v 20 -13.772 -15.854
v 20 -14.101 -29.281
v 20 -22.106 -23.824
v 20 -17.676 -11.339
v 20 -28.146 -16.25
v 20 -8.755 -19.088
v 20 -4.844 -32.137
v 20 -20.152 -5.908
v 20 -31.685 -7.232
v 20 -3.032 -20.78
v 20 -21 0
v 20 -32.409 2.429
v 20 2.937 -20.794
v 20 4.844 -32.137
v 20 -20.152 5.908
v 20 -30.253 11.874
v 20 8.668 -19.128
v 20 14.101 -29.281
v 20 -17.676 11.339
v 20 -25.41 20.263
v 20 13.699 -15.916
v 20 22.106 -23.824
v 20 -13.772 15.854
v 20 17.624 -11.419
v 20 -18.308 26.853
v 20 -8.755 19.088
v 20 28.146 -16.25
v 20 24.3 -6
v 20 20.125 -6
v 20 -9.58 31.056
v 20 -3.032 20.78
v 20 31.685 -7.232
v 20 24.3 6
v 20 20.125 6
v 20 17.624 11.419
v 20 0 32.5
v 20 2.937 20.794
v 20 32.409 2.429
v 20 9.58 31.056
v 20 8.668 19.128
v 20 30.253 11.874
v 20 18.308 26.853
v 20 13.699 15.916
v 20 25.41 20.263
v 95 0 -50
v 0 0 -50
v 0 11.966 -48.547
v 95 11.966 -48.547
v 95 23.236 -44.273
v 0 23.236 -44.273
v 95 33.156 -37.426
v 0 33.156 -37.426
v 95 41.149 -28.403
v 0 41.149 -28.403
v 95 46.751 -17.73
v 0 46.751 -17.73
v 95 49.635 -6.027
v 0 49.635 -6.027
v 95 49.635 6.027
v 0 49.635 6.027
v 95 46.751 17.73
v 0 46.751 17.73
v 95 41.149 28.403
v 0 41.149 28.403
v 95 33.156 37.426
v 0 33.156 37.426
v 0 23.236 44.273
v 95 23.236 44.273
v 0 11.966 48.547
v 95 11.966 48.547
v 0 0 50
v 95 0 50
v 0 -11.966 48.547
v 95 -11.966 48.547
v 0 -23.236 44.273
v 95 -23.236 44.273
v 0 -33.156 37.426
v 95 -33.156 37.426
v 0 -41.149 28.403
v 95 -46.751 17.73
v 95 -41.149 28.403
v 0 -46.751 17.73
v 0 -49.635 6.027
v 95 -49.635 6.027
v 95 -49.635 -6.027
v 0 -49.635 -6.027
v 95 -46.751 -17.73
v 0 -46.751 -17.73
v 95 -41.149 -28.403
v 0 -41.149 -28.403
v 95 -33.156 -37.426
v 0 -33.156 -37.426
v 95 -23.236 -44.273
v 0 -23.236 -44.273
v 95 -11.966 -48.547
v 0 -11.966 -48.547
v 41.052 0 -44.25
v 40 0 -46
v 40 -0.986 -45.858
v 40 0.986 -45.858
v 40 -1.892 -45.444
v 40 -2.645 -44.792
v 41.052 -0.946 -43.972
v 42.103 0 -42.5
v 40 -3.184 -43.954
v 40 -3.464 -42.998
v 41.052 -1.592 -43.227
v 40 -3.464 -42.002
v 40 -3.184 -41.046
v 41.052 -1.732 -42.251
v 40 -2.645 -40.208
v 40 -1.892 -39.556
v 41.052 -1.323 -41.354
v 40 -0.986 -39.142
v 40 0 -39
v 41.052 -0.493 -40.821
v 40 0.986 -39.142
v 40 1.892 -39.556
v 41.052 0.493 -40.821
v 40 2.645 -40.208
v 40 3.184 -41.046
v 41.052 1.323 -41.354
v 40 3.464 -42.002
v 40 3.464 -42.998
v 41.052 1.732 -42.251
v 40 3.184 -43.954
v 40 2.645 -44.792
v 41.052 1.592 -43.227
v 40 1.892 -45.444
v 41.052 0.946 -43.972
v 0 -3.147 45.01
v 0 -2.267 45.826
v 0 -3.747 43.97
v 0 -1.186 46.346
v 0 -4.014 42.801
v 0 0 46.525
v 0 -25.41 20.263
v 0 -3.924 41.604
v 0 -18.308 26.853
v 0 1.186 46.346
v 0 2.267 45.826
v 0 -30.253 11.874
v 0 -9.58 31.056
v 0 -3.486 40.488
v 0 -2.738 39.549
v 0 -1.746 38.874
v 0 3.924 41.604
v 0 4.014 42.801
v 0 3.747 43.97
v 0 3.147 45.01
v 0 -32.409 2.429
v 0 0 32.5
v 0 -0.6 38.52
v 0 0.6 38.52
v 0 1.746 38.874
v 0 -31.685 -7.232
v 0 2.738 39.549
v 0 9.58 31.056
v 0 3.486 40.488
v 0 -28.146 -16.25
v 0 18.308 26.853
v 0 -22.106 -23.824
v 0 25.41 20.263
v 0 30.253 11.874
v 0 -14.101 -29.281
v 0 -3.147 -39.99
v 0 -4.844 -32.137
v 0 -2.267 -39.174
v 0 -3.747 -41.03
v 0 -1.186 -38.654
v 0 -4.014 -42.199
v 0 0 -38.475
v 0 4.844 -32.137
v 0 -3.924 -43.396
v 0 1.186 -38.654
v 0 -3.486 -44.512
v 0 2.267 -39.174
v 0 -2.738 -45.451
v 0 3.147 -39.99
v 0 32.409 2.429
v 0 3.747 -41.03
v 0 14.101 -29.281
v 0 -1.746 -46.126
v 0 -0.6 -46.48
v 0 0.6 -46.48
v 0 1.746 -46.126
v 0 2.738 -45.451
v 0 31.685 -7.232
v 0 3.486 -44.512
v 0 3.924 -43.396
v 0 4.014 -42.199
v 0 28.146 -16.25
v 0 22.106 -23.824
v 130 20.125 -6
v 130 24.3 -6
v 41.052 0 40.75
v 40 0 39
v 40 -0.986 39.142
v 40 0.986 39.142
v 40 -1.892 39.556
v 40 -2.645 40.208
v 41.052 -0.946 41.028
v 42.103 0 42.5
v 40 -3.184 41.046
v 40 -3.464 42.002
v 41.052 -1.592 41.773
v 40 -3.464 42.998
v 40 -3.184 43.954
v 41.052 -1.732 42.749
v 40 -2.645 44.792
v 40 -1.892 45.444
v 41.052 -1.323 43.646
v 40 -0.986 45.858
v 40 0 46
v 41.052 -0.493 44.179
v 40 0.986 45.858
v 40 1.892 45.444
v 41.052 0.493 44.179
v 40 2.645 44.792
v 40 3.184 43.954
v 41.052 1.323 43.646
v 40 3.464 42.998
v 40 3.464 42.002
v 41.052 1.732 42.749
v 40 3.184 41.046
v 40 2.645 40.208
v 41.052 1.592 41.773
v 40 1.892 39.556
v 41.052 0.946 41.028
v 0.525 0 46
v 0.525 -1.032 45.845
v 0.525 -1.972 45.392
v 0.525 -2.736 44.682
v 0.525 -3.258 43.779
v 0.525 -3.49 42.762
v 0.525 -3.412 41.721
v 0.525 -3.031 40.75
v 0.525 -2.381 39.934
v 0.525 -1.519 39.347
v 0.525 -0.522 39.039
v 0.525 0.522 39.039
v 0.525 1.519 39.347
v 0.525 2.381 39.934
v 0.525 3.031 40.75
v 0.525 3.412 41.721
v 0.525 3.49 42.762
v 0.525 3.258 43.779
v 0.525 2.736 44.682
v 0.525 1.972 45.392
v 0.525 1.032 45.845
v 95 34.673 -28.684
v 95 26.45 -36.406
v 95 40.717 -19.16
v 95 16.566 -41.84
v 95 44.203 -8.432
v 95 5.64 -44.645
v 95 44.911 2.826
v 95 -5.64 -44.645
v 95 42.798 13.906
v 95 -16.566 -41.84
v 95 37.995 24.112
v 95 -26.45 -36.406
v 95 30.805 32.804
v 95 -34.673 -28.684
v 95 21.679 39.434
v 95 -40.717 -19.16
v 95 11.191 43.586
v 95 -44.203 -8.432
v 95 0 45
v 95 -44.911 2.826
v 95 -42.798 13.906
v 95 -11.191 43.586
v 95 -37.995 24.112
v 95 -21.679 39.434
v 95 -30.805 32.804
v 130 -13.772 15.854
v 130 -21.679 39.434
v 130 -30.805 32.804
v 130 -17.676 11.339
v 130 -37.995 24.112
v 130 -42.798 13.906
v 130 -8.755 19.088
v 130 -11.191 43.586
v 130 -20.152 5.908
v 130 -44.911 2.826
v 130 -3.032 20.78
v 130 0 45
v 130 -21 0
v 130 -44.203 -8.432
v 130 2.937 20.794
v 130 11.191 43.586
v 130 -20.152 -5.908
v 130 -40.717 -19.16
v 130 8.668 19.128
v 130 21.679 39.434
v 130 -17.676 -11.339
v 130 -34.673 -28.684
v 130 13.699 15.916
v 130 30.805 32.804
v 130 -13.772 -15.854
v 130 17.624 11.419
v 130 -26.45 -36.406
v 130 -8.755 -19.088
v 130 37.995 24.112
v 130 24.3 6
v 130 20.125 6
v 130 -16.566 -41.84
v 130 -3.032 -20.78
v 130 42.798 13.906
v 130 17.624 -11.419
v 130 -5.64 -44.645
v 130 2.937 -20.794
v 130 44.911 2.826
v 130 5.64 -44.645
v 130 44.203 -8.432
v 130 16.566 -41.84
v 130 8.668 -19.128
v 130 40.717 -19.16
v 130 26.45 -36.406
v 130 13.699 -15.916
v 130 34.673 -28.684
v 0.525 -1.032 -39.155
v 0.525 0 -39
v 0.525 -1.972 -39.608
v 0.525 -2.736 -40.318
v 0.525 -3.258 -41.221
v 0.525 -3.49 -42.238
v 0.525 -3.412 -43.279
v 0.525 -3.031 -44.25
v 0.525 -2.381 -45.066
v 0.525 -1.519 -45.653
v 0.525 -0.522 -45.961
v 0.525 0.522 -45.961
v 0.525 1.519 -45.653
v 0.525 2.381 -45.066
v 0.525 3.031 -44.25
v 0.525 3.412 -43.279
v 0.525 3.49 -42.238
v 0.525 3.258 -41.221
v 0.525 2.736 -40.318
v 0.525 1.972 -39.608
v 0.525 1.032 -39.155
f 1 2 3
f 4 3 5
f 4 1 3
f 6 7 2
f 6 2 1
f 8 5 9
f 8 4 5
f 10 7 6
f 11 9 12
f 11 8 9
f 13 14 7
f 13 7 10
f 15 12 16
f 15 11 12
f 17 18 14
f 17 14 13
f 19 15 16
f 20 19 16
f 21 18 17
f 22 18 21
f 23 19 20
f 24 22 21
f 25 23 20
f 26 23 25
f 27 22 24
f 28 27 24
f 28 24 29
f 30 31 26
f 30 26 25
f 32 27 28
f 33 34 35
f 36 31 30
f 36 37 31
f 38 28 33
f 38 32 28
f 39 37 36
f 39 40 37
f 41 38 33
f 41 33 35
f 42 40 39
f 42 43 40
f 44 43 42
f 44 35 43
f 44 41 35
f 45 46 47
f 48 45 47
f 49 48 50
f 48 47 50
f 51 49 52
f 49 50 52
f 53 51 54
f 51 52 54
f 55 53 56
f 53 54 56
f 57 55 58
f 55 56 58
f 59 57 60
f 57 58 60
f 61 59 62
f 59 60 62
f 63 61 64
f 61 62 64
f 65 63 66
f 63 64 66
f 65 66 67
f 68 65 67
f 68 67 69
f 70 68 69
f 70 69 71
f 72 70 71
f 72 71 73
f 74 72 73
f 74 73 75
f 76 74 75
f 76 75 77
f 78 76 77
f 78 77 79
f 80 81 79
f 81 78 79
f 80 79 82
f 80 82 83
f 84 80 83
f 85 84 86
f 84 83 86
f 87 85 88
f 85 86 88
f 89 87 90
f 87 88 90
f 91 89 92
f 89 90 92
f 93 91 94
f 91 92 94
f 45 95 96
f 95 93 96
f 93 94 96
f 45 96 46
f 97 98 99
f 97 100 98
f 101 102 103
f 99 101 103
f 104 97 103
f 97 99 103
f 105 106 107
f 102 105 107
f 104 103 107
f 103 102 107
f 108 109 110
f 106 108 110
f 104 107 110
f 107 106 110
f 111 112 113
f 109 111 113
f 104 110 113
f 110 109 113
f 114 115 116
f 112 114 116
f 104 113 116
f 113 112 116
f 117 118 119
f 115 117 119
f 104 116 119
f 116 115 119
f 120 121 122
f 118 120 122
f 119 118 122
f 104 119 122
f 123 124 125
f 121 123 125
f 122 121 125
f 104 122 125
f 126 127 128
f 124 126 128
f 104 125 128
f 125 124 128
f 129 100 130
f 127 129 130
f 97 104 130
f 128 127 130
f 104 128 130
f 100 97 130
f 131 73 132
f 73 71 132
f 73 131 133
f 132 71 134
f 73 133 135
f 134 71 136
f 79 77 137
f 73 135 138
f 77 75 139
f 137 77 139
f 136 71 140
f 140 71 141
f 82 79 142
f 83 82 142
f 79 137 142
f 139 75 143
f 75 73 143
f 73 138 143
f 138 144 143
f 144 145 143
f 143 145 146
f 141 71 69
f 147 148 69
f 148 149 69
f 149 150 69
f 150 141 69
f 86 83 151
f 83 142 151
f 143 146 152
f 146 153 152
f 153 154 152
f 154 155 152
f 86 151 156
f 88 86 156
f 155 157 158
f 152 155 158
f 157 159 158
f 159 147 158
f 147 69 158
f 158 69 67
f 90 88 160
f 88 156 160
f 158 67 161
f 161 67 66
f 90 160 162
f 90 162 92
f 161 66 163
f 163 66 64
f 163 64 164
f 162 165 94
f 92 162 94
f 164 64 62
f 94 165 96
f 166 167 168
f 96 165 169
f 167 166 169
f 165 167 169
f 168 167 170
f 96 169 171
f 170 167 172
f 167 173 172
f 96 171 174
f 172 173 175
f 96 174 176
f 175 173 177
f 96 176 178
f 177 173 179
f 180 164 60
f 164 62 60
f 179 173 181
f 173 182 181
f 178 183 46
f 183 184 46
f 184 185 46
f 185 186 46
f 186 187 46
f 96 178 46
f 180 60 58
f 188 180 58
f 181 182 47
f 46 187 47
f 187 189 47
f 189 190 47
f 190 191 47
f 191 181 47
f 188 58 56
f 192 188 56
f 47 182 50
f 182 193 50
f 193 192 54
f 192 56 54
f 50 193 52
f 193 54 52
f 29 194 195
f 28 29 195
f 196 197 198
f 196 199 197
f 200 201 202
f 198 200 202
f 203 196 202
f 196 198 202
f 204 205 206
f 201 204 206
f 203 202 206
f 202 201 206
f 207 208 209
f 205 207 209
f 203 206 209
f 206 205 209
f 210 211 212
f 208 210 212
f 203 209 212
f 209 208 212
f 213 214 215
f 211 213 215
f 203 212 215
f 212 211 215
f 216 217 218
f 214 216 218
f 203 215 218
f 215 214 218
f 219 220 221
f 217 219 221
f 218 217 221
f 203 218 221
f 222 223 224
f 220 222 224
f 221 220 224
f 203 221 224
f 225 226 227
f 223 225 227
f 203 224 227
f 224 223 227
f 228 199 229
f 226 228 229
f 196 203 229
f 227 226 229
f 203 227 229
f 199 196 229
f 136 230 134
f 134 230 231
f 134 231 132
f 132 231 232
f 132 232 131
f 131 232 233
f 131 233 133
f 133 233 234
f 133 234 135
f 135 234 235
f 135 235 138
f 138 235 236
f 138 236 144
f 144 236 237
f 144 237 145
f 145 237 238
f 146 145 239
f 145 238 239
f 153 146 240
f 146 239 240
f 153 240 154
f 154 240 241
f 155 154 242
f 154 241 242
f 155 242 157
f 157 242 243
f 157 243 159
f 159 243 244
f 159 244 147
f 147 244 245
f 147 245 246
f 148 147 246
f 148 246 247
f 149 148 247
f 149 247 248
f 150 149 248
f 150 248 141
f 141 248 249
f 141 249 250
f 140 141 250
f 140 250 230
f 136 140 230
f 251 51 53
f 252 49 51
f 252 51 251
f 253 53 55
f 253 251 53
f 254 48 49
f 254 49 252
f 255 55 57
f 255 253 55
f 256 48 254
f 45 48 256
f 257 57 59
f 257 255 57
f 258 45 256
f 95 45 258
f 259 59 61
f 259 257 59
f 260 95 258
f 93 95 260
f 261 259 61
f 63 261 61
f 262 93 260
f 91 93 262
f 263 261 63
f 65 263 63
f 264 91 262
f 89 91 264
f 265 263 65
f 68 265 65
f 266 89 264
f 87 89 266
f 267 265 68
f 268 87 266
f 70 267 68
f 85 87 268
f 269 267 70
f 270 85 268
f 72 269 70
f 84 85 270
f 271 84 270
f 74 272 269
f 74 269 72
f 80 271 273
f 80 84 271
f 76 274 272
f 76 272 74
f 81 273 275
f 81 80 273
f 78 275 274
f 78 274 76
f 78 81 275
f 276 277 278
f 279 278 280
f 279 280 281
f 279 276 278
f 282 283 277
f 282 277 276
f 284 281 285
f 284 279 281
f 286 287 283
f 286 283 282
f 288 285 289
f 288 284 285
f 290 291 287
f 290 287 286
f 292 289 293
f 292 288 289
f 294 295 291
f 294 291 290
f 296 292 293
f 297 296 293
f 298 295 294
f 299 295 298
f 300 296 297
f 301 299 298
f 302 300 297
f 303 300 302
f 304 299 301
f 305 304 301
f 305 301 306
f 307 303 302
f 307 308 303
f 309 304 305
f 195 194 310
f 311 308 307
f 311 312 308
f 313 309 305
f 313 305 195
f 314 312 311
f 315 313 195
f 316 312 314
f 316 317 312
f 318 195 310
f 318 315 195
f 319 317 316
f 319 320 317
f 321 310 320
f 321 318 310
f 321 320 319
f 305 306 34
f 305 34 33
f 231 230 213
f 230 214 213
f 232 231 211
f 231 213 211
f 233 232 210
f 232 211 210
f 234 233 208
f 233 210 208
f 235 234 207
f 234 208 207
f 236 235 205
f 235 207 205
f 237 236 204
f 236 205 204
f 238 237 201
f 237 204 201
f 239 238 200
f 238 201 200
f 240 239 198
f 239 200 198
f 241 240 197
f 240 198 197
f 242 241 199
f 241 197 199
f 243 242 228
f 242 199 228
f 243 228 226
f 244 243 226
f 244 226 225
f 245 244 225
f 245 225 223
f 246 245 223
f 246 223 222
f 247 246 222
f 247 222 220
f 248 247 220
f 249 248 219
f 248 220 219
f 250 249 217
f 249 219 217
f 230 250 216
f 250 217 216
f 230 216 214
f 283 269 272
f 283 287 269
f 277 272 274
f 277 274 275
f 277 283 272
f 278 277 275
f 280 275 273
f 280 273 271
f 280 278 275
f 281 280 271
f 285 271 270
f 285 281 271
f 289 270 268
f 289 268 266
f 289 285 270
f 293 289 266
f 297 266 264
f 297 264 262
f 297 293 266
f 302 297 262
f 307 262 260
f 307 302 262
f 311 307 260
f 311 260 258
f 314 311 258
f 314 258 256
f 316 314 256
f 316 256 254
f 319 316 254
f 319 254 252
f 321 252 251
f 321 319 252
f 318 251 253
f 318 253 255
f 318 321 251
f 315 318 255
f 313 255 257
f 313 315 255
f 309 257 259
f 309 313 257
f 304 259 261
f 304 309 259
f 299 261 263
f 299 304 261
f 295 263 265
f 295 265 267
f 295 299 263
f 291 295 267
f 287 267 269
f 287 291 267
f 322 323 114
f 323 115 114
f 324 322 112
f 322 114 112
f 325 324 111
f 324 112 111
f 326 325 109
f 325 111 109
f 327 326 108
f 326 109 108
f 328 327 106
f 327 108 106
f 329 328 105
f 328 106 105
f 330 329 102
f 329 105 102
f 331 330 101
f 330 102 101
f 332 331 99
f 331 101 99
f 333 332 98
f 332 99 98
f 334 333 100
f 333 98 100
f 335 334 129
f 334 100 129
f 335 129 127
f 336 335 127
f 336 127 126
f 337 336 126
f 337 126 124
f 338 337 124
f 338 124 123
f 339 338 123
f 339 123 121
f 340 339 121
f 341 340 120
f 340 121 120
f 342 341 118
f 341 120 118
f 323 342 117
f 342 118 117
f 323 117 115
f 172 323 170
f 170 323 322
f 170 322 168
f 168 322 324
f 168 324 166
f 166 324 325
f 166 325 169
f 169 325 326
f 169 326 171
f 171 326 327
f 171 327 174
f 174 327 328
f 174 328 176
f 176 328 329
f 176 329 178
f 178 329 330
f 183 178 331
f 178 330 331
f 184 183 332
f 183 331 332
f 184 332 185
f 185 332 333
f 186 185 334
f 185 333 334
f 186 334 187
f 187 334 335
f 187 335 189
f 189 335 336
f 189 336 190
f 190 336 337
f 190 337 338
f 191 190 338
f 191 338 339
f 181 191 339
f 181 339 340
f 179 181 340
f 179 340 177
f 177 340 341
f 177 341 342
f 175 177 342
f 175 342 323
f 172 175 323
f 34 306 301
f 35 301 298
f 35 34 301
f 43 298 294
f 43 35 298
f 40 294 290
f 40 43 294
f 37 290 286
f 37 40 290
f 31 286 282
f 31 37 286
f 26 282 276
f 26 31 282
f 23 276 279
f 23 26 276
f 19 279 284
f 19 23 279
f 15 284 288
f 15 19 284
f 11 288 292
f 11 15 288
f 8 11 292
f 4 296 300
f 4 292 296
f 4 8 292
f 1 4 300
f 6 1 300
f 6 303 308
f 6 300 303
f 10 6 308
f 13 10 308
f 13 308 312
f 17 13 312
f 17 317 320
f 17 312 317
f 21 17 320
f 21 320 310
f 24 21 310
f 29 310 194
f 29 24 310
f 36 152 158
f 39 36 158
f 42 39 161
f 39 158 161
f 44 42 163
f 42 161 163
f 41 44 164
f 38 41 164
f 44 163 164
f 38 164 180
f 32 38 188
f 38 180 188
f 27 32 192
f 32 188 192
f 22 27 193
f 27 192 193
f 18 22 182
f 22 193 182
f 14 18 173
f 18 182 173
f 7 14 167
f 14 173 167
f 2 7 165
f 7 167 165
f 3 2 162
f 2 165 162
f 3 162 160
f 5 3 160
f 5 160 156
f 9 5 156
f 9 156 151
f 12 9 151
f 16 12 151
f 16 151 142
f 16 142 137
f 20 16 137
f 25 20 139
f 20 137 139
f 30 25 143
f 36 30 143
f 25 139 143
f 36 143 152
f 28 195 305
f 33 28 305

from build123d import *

# Parameters (mm, degrees)
SKETCH1_R                       = 50
SKETCH1_R_2                     = 21
BOSS_EXTRUDE1_DEPTH             = 130
CUT_EXTRUDE1_DEPTH              = 148.986485869
CUT_EXTRUDE1_DEPTH_BACK         = 148.986485869
SKETCH2_W                       = 12
SKETCH2_H                       = 6.6
SKETCH3_W                       = 35
SKETCH3_H                       = 5
SKETCH4_R                       = 32.5
CUT_EXTRUDE2_DEPTH              = 20
M8X1_0_TAPPED_HOLE1_D           = 7
M8X1_0_TAPPED_HOLE1_DEPTH       = 40
M8X1_0_TAPPED_HOLE1_CSINK_D     = 8.05
M8X1_0_TAPPED_HOLE1_CSINK_ANGLE = 90
M8X1_0_TAPPED_HOLE1_TIP         = 2.103012167


with BuildPart() as part:
    # Sketch1 → Boss-Extrude1 (new body)
    with BuildSketch(Plane(origin=(0, 0, 0), x_dir=(0, 0, -1), z_dir=(1, 0, 0))):
        Circle(SKETCH1_R)
        Circle(SKETCH1_R_2, mode=Mode.SUBTRACT)
    extrude(amount=BOSS_EXTRUDE1_DEPTH)

    # Sketch2 → Cut-Extrude1 (cut, two sides: drawn at the far end of the back side and taken through both)
    with BuildSketch(Plane.ZY.offset(-CUT_EXTRUDE1_DEPTH_BACK)):
        with Locations((0, 21)):
            Rectangle(SKETCH2_W, SKETCH2_H)
    extrude(amount=CUT_EXTRUDE1_DEPTH + CUT_EXTRUDE1_DEPTH_BACK, mode=Mode.SUBTRACT)

    # Sketch3 → Cut-Revolve1 (revolve, cut)
    with BuildSketch(Plane(origin=(0, 0, 0), x_dir=(1, 0, 0), z_dir=(0, 1, 0))):
        with Locations((112.5, -47.5)):
            Rectangle(SKETCH3_W, SKETCH3_H)
    revolve(axis=Axis((0, 0, 0), (1, 0, 0)), mode=Mode.SUBTRACT)

    # Sketch4 → Cut-Extrude2 (cut)
    with BuildSketch(Plane.ZY):
        Circle(SKETCH4_R)
    extrude(amount=-CUT_EXTRUDE2_DEPTH, mode=Mode.SUBTRACT)

    # M8x1.0 Tapped Hole1
    with Locations(Plane(origin=(0, 0, -42.5), x_dir=(0, 0, -1), z_dir=(-1, 0, 0))):
        with Locations((0, 0), (-85, 0)):
            CounterSinkHole(M8X1_0_TAPPED_HOLE1_D / 2, M8X1_0_TAPPED_HOLE1_CSINK_D / 2, depth=M8X1_0_TAPPED_HOLE1_DEPTH, counter_sink_angle=M8X1_0_TAPPED_HOLE1_CSINK_ANGLE)
            with Locations((0, 0, -(M8X1_0_TAPPED_HOLE1_DEPTH + M8X1_0_TAPPED_HOLE1_TIP / 2))):  # 118° drill point
                Cone(0, M8X1_0_TAPPED_HOLE1_D / 2, M8X1_0_TAPPED_HOLE1_TIP, mode=Mode.SUBTRACT)


solid = part.part
